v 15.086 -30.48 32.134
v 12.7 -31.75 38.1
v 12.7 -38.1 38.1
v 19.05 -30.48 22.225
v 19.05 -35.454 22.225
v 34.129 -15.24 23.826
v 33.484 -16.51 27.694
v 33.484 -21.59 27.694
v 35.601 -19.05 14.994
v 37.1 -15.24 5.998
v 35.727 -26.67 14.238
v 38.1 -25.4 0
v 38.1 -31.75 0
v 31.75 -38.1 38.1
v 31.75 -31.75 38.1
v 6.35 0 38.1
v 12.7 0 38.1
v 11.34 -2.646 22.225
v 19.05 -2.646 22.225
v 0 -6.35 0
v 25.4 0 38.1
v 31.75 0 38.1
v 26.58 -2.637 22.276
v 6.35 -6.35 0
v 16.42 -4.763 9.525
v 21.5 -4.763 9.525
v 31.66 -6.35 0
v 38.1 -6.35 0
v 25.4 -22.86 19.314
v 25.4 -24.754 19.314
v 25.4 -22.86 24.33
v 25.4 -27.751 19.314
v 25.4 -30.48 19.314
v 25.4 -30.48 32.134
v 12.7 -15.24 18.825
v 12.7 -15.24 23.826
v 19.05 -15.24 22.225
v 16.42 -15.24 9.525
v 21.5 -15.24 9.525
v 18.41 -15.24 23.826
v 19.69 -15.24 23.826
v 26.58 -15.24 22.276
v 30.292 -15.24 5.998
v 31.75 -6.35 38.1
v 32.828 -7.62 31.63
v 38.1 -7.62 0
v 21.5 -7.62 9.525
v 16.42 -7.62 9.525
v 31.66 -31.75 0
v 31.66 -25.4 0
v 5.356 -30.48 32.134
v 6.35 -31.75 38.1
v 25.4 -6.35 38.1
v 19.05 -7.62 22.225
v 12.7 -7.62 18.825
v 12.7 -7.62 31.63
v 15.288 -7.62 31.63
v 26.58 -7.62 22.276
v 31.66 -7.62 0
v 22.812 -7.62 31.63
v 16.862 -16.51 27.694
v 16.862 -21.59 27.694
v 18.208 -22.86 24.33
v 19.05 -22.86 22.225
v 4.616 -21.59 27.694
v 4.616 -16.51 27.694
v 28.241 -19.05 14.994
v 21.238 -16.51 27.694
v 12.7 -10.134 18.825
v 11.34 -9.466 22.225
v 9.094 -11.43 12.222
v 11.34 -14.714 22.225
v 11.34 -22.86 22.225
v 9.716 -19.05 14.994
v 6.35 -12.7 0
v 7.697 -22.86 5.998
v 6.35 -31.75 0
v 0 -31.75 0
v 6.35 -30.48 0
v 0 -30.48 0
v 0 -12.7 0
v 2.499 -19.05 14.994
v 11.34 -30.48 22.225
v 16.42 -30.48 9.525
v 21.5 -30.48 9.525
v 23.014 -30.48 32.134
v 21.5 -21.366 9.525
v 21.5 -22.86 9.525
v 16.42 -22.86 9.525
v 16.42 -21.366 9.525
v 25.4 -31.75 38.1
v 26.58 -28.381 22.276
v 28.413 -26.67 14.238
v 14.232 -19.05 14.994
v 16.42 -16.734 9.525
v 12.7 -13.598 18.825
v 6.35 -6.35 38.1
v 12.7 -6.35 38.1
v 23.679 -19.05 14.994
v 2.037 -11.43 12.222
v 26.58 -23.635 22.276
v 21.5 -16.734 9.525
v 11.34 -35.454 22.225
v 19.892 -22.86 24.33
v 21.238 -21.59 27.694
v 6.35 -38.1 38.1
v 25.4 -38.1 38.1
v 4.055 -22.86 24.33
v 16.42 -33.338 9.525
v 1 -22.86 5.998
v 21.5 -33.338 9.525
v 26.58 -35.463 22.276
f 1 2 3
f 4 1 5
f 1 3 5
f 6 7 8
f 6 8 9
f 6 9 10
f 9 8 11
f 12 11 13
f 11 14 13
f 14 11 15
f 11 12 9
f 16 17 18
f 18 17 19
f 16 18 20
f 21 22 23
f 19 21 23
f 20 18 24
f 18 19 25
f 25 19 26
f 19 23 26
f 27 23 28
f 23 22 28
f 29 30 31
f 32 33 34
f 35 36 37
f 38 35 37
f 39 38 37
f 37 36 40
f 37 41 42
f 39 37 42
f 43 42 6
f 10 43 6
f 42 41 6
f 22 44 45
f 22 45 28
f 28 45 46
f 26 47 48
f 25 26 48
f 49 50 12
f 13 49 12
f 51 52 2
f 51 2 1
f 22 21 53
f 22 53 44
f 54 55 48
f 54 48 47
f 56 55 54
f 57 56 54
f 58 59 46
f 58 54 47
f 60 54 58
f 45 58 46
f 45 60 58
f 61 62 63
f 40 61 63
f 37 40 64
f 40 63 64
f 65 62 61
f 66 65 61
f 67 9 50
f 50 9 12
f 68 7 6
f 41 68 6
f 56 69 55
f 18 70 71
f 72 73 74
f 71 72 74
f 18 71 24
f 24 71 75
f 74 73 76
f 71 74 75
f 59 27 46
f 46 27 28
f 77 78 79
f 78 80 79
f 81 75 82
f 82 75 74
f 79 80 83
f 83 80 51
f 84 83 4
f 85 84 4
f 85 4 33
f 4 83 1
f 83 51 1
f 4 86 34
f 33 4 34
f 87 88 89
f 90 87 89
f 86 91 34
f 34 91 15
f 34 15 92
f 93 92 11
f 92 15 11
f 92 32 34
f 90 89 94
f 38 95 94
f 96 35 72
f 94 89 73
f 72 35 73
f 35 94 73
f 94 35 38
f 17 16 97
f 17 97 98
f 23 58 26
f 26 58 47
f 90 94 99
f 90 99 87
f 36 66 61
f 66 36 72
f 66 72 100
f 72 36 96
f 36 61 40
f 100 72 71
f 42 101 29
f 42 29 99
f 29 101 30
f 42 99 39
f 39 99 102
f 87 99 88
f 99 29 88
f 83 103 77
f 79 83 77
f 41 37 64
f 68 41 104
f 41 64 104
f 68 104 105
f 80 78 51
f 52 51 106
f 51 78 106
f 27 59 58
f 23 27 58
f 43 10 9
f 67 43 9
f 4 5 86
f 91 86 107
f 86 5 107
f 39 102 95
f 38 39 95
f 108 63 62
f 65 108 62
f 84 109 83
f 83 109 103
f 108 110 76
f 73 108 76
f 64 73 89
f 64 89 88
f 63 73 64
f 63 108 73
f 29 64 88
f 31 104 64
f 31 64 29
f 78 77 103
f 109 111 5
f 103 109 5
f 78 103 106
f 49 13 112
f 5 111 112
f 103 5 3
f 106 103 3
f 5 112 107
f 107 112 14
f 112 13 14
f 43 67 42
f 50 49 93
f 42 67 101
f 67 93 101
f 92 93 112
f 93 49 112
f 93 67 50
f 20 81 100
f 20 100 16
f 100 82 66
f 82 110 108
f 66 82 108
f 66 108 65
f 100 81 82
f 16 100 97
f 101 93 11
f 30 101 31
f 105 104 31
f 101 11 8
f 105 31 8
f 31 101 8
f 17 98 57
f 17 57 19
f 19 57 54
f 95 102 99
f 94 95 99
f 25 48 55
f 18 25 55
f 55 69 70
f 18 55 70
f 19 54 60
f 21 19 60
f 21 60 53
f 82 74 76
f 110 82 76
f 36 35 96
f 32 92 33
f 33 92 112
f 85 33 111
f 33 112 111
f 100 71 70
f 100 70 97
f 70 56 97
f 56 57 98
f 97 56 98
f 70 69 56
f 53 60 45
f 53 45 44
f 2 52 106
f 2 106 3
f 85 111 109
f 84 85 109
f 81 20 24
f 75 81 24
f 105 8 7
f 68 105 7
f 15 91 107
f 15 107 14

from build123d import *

# Parameters (mm, degrees)
F0_W      = 38.1
F0_H      = 38.1
F1_DEPTH  = 38.1
F6_DEPTH  = 38.1
F8_DEPTH  = 38.1
F9_W      = 25.4
F9_H      = 7.62
F10_DEPTH = 38.1


# Not quite as in the source:
# - a feature names something its author has since deleted; it is built from what else it names


with BuildPart() as f1:
    # F0 (on Front) → F1 (new body)
    with BuildSketch(Plane.XZ):
        with Locations((19.05, 19.05)):
            Rectangle(F0_W, F0_H)
    extrude(amount=F1_DEPTH)

    # F5 (on offset) → F6 (cut)
    with BuildSketch(Plane.YZ.offset(38.1)):
        Polygon((-11.43, 12.2219994664), (-6.35, 38.1), (-31.75, 38.1), (-26.67, 14.2379999161), (-21.59, 27.6940000847), (-16.51, 27.6940000847), align=None)
        Polygon((-31.75, 0), (-38.1, 38.1), (-38.1, 0), align=None)
        Polygon((-25.4, 0), (-19.05, 0), (-19.05, 14.9940000847), align=None)
        Polygon((-19.05, 0), (-12.7, 0), (-19.05, 14.9940000847), align=None)
        Polygon((-6.35, 0), (0, 0), (0, 38.1), align=None)
    extrude(amount=-F6_DEPTH, mode=Mode.SUBTRACT)

    # F7 (on offset) → F8 (cut)
    with BuildSketch(Plane.XZ.offset(38.1)):
        Polygon((0, 38.1), (0, 0), (6.35, 38.1), align=None)
        Polygon((25.4, 38.1), (12.7, 38.1), (19.05, 22.225), align=None)
        Polygon((31.75, 38.1), (38.1, 0), (38.1, 38.1), align=None)
        Polygon((11.340001598, 22.225), (6.35, 0), (31.660001598, 0), (26.580001598, 22.2758815411), (21.500001598, 9.525), (16.420001598, 9.525), align=None)
    extrude(amount=-F8_DEPTH, mode=Mode.SUBTRACT)

    # F9 (on offset) → F10 (cut)
    with BuildSketch(Plane.XY.offset(38.1)):
        with Locations((25.4, -11.43)):
            Rectangle(F9_W, F9_H)
        with Locations((12.7, -26.67)):
            Rectangle(F9_W, F9_H)
    extrude(amount=-F10_DEPTH, mode=Mode.SUBTRACT)


solid = f1.part
